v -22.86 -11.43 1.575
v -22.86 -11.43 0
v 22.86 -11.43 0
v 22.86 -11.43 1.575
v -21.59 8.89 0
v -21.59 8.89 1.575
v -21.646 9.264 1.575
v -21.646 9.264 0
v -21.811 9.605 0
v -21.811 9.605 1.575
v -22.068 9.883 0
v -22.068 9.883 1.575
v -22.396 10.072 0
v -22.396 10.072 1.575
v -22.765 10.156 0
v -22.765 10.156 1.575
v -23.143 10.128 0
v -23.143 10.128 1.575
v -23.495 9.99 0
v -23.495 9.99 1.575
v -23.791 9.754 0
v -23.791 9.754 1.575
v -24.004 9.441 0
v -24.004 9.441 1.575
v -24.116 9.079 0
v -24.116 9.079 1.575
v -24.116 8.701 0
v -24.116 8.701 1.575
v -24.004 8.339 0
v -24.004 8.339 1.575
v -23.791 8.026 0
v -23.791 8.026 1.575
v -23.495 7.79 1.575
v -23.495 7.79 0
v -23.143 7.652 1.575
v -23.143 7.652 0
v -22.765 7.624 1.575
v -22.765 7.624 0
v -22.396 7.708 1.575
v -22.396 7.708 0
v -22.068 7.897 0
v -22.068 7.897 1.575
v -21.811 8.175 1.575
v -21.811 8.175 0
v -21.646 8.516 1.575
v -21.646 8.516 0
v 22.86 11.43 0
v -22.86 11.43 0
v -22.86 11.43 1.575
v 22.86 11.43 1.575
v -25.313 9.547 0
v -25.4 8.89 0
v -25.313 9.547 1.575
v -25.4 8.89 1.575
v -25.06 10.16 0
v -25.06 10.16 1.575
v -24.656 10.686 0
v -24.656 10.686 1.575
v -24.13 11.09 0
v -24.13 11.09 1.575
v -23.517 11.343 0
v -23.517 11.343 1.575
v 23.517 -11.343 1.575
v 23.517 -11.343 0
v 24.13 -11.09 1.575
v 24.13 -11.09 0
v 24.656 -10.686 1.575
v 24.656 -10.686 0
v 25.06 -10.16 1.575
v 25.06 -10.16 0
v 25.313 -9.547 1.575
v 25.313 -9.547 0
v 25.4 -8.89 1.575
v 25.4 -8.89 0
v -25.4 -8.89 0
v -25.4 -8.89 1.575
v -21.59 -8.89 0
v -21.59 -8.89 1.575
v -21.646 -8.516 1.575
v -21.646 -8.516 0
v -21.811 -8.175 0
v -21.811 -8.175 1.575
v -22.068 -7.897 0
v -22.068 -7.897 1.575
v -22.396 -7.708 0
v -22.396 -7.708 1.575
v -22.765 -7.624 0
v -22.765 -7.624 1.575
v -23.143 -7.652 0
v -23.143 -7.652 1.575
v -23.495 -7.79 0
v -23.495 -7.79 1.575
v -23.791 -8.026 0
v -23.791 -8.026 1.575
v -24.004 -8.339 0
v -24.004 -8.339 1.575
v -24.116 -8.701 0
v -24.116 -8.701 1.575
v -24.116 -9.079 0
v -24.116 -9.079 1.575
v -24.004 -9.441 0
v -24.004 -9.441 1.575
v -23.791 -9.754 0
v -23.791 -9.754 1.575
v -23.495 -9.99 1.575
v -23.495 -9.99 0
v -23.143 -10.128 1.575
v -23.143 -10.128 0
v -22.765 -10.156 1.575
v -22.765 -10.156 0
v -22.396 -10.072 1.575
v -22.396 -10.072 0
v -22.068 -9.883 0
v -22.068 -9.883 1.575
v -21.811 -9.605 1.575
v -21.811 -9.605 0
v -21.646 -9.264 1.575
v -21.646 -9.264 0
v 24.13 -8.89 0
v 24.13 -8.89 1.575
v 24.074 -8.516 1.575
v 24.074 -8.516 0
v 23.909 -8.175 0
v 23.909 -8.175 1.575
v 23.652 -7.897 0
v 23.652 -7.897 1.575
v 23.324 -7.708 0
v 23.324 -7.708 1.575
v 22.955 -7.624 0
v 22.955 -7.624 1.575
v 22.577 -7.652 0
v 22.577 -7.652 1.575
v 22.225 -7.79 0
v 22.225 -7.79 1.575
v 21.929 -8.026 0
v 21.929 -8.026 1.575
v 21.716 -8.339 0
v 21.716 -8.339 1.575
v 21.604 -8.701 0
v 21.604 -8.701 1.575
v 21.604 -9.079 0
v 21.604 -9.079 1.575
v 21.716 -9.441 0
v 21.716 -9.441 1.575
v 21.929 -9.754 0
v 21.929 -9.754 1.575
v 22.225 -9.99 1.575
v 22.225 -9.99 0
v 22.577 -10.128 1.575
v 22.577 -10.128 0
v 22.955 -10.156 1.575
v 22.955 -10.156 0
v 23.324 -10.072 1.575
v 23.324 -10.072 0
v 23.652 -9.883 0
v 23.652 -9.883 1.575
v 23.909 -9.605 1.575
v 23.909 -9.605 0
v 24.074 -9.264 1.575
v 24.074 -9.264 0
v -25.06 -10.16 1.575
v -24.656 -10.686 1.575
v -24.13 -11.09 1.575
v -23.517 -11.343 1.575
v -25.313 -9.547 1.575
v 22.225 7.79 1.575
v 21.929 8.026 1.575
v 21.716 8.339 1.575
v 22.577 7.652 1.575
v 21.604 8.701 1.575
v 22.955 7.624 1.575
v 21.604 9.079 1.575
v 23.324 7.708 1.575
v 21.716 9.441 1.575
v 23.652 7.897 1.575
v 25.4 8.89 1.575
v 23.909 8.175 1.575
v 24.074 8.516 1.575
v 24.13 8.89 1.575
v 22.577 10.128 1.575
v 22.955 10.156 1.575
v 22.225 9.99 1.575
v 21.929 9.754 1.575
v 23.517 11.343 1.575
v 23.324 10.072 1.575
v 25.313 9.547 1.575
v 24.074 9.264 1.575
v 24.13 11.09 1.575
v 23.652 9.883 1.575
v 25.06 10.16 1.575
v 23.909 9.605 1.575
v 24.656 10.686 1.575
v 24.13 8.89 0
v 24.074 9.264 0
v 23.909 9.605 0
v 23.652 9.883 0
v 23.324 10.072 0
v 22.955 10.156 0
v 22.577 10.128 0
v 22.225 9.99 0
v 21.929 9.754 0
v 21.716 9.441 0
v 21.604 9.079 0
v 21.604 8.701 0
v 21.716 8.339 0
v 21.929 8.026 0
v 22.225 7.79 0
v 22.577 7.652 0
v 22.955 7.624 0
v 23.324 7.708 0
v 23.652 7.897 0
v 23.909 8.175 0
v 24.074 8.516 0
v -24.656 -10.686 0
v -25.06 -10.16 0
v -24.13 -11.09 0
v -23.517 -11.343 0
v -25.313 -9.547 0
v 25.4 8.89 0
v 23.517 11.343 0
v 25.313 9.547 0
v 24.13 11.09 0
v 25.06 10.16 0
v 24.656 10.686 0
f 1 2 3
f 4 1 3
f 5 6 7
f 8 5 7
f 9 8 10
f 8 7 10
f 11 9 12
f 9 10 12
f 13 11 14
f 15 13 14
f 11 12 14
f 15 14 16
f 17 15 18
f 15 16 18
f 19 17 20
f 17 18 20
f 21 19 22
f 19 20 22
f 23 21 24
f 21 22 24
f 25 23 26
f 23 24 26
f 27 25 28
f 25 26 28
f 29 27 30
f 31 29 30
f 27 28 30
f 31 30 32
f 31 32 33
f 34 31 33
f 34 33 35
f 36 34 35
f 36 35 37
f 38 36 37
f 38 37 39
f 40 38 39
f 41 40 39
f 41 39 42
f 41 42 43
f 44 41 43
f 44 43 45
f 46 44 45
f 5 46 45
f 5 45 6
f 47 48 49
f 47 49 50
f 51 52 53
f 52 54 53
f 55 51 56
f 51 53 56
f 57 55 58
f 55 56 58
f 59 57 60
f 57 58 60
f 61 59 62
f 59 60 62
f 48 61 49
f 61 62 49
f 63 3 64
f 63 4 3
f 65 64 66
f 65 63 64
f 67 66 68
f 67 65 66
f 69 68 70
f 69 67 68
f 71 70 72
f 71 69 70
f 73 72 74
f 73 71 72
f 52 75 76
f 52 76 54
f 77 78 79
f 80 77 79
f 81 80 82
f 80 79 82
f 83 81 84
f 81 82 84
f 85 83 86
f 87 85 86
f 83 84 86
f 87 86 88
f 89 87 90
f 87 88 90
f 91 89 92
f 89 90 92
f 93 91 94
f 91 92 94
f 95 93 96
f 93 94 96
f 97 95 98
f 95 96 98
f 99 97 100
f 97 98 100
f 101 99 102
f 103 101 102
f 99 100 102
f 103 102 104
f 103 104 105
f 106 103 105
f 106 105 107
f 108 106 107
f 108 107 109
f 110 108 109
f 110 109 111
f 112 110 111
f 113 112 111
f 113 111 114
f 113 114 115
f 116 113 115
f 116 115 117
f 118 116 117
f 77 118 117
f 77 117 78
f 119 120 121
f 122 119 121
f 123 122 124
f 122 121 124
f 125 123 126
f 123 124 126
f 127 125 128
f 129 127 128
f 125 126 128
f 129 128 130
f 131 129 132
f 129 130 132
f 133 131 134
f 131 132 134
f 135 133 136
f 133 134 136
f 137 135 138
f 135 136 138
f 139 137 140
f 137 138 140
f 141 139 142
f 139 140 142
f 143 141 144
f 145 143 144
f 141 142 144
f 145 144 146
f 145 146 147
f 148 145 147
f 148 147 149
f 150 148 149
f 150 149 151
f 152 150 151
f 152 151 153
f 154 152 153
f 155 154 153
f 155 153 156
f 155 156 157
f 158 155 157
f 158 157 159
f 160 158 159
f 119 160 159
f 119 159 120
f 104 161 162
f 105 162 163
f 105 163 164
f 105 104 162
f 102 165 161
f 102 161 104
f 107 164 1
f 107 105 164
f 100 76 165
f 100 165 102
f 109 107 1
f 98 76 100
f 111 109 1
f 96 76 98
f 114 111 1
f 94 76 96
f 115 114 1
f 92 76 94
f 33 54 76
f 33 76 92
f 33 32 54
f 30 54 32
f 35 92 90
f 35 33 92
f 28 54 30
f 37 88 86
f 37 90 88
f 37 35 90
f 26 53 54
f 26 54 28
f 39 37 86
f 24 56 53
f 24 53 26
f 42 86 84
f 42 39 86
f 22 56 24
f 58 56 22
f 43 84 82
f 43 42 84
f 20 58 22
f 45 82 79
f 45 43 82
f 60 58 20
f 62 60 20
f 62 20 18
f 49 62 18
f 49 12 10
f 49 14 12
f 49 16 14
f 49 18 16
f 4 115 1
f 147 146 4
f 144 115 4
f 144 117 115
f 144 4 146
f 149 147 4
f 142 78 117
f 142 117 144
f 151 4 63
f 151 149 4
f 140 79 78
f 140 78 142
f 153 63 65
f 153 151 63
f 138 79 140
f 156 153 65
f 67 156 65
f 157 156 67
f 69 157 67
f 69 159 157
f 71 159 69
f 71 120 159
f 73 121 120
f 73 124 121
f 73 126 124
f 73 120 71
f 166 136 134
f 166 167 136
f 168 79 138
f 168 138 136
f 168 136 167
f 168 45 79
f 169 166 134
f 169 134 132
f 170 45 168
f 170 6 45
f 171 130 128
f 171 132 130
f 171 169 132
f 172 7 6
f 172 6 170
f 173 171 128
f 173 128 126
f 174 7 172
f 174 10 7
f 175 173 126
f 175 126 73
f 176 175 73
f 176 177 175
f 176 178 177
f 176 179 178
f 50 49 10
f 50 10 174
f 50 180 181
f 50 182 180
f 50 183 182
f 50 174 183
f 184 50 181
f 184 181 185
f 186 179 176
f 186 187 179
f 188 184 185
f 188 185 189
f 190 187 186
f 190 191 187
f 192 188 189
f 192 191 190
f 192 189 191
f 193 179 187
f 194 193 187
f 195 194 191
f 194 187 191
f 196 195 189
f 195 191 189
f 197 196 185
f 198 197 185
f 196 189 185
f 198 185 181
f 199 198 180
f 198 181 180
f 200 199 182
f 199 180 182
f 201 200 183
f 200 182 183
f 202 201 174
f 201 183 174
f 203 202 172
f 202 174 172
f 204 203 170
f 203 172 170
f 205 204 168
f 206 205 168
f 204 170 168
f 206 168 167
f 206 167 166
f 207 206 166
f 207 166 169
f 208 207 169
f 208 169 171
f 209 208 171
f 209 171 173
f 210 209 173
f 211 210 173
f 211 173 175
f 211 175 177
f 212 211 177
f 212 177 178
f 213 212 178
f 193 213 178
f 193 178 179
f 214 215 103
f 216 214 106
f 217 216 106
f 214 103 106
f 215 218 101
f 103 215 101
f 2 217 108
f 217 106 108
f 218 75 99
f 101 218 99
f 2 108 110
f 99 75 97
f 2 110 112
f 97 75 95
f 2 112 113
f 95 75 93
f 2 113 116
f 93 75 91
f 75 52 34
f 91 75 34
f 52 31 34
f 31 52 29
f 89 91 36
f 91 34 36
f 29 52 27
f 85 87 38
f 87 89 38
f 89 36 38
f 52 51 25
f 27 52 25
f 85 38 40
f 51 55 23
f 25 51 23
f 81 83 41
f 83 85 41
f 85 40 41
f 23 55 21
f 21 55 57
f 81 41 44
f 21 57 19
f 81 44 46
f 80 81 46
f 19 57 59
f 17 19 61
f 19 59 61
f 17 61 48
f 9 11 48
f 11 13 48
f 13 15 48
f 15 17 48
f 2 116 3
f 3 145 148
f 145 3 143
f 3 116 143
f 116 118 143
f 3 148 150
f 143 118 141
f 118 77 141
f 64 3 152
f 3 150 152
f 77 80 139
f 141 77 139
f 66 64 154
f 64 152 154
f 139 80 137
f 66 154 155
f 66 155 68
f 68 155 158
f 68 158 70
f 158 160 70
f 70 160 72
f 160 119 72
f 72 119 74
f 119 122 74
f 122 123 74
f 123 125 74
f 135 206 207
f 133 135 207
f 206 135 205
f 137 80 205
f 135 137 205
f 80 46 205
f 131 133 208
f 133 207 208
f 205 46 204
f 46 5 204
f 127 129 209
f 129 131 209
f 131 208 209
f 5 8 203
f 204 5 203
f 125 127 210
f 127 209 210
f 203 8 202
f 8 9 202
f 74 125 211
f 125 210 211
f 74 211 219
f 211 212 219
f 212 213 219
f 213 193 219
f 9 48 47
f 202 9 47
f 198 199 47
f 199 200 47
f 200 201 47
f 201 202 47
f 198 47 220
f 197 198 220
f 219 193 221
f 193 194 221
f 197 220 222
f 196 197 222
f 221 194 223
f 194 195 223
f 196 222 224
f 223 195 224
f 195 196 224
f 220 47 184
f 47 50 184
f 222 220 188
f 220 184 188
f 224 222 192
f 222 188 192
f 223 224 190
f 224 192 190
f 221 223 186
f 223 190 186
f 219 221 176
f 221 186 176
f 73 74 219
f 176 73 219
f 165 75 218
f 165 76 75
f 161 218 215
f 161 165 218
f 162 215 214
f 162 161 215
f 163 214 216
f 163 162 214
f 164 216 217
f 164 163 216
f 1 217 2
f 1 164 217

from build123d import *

# Parameters (mm, degrees)
SKETCH1_W           = 50.8
SKETCH1_H           = 22.86
BOSS_EXTRUDE1_DEPTH = 1.5748
SKETCH2_R           = 1.27
CUT_EXTRUDE1_DEPTH  = 2.5748
FILLET1_R           = 2.54


with BuildPart() as part:
    # Sketch1 → Boss-Extrude1 (new body)
    with BuildSketch(Plane.XY):
        Rectangle(SKETCH1_W, SKETCH1_H)
    extrude(amount=BOSS_EXTRUDE1_DEPTH)

    # Sketch2 → Cut-Extrude1 (cut, through all)
    with BuildSketch(Plane.XY.offset(1.5748)):
        with Locations((-22.86, 8.89)):
            Circle(SKETCH2_R)
        with Locations((22.86, 8.89)):
            Circle(SKETCH2_R)
        with Locations((-22.86, -8.89)):
            Circle(SKETCH2_R)
        with Locations((22.86, -8.89)):
            Circle(SKETCH2_R)
    extrude(amount=-CUT_EXTRUDE1_DEPTH, mode=Mode.SUBTRACT)

    # Fillet1
    fillet1_edges = [part.edges().sort_by_distance(p)[0] for p in [
        (-25.4, 11.43, 0.7874),
        (25.4, 11.43, 0.7874),
        (25.4, -11.43, 0.7874),
        (-25.4, -11.43, 0.7874),
    ]]
    fillet(fillet1_edges, radius=FILLET1_R)


solid = part.part
